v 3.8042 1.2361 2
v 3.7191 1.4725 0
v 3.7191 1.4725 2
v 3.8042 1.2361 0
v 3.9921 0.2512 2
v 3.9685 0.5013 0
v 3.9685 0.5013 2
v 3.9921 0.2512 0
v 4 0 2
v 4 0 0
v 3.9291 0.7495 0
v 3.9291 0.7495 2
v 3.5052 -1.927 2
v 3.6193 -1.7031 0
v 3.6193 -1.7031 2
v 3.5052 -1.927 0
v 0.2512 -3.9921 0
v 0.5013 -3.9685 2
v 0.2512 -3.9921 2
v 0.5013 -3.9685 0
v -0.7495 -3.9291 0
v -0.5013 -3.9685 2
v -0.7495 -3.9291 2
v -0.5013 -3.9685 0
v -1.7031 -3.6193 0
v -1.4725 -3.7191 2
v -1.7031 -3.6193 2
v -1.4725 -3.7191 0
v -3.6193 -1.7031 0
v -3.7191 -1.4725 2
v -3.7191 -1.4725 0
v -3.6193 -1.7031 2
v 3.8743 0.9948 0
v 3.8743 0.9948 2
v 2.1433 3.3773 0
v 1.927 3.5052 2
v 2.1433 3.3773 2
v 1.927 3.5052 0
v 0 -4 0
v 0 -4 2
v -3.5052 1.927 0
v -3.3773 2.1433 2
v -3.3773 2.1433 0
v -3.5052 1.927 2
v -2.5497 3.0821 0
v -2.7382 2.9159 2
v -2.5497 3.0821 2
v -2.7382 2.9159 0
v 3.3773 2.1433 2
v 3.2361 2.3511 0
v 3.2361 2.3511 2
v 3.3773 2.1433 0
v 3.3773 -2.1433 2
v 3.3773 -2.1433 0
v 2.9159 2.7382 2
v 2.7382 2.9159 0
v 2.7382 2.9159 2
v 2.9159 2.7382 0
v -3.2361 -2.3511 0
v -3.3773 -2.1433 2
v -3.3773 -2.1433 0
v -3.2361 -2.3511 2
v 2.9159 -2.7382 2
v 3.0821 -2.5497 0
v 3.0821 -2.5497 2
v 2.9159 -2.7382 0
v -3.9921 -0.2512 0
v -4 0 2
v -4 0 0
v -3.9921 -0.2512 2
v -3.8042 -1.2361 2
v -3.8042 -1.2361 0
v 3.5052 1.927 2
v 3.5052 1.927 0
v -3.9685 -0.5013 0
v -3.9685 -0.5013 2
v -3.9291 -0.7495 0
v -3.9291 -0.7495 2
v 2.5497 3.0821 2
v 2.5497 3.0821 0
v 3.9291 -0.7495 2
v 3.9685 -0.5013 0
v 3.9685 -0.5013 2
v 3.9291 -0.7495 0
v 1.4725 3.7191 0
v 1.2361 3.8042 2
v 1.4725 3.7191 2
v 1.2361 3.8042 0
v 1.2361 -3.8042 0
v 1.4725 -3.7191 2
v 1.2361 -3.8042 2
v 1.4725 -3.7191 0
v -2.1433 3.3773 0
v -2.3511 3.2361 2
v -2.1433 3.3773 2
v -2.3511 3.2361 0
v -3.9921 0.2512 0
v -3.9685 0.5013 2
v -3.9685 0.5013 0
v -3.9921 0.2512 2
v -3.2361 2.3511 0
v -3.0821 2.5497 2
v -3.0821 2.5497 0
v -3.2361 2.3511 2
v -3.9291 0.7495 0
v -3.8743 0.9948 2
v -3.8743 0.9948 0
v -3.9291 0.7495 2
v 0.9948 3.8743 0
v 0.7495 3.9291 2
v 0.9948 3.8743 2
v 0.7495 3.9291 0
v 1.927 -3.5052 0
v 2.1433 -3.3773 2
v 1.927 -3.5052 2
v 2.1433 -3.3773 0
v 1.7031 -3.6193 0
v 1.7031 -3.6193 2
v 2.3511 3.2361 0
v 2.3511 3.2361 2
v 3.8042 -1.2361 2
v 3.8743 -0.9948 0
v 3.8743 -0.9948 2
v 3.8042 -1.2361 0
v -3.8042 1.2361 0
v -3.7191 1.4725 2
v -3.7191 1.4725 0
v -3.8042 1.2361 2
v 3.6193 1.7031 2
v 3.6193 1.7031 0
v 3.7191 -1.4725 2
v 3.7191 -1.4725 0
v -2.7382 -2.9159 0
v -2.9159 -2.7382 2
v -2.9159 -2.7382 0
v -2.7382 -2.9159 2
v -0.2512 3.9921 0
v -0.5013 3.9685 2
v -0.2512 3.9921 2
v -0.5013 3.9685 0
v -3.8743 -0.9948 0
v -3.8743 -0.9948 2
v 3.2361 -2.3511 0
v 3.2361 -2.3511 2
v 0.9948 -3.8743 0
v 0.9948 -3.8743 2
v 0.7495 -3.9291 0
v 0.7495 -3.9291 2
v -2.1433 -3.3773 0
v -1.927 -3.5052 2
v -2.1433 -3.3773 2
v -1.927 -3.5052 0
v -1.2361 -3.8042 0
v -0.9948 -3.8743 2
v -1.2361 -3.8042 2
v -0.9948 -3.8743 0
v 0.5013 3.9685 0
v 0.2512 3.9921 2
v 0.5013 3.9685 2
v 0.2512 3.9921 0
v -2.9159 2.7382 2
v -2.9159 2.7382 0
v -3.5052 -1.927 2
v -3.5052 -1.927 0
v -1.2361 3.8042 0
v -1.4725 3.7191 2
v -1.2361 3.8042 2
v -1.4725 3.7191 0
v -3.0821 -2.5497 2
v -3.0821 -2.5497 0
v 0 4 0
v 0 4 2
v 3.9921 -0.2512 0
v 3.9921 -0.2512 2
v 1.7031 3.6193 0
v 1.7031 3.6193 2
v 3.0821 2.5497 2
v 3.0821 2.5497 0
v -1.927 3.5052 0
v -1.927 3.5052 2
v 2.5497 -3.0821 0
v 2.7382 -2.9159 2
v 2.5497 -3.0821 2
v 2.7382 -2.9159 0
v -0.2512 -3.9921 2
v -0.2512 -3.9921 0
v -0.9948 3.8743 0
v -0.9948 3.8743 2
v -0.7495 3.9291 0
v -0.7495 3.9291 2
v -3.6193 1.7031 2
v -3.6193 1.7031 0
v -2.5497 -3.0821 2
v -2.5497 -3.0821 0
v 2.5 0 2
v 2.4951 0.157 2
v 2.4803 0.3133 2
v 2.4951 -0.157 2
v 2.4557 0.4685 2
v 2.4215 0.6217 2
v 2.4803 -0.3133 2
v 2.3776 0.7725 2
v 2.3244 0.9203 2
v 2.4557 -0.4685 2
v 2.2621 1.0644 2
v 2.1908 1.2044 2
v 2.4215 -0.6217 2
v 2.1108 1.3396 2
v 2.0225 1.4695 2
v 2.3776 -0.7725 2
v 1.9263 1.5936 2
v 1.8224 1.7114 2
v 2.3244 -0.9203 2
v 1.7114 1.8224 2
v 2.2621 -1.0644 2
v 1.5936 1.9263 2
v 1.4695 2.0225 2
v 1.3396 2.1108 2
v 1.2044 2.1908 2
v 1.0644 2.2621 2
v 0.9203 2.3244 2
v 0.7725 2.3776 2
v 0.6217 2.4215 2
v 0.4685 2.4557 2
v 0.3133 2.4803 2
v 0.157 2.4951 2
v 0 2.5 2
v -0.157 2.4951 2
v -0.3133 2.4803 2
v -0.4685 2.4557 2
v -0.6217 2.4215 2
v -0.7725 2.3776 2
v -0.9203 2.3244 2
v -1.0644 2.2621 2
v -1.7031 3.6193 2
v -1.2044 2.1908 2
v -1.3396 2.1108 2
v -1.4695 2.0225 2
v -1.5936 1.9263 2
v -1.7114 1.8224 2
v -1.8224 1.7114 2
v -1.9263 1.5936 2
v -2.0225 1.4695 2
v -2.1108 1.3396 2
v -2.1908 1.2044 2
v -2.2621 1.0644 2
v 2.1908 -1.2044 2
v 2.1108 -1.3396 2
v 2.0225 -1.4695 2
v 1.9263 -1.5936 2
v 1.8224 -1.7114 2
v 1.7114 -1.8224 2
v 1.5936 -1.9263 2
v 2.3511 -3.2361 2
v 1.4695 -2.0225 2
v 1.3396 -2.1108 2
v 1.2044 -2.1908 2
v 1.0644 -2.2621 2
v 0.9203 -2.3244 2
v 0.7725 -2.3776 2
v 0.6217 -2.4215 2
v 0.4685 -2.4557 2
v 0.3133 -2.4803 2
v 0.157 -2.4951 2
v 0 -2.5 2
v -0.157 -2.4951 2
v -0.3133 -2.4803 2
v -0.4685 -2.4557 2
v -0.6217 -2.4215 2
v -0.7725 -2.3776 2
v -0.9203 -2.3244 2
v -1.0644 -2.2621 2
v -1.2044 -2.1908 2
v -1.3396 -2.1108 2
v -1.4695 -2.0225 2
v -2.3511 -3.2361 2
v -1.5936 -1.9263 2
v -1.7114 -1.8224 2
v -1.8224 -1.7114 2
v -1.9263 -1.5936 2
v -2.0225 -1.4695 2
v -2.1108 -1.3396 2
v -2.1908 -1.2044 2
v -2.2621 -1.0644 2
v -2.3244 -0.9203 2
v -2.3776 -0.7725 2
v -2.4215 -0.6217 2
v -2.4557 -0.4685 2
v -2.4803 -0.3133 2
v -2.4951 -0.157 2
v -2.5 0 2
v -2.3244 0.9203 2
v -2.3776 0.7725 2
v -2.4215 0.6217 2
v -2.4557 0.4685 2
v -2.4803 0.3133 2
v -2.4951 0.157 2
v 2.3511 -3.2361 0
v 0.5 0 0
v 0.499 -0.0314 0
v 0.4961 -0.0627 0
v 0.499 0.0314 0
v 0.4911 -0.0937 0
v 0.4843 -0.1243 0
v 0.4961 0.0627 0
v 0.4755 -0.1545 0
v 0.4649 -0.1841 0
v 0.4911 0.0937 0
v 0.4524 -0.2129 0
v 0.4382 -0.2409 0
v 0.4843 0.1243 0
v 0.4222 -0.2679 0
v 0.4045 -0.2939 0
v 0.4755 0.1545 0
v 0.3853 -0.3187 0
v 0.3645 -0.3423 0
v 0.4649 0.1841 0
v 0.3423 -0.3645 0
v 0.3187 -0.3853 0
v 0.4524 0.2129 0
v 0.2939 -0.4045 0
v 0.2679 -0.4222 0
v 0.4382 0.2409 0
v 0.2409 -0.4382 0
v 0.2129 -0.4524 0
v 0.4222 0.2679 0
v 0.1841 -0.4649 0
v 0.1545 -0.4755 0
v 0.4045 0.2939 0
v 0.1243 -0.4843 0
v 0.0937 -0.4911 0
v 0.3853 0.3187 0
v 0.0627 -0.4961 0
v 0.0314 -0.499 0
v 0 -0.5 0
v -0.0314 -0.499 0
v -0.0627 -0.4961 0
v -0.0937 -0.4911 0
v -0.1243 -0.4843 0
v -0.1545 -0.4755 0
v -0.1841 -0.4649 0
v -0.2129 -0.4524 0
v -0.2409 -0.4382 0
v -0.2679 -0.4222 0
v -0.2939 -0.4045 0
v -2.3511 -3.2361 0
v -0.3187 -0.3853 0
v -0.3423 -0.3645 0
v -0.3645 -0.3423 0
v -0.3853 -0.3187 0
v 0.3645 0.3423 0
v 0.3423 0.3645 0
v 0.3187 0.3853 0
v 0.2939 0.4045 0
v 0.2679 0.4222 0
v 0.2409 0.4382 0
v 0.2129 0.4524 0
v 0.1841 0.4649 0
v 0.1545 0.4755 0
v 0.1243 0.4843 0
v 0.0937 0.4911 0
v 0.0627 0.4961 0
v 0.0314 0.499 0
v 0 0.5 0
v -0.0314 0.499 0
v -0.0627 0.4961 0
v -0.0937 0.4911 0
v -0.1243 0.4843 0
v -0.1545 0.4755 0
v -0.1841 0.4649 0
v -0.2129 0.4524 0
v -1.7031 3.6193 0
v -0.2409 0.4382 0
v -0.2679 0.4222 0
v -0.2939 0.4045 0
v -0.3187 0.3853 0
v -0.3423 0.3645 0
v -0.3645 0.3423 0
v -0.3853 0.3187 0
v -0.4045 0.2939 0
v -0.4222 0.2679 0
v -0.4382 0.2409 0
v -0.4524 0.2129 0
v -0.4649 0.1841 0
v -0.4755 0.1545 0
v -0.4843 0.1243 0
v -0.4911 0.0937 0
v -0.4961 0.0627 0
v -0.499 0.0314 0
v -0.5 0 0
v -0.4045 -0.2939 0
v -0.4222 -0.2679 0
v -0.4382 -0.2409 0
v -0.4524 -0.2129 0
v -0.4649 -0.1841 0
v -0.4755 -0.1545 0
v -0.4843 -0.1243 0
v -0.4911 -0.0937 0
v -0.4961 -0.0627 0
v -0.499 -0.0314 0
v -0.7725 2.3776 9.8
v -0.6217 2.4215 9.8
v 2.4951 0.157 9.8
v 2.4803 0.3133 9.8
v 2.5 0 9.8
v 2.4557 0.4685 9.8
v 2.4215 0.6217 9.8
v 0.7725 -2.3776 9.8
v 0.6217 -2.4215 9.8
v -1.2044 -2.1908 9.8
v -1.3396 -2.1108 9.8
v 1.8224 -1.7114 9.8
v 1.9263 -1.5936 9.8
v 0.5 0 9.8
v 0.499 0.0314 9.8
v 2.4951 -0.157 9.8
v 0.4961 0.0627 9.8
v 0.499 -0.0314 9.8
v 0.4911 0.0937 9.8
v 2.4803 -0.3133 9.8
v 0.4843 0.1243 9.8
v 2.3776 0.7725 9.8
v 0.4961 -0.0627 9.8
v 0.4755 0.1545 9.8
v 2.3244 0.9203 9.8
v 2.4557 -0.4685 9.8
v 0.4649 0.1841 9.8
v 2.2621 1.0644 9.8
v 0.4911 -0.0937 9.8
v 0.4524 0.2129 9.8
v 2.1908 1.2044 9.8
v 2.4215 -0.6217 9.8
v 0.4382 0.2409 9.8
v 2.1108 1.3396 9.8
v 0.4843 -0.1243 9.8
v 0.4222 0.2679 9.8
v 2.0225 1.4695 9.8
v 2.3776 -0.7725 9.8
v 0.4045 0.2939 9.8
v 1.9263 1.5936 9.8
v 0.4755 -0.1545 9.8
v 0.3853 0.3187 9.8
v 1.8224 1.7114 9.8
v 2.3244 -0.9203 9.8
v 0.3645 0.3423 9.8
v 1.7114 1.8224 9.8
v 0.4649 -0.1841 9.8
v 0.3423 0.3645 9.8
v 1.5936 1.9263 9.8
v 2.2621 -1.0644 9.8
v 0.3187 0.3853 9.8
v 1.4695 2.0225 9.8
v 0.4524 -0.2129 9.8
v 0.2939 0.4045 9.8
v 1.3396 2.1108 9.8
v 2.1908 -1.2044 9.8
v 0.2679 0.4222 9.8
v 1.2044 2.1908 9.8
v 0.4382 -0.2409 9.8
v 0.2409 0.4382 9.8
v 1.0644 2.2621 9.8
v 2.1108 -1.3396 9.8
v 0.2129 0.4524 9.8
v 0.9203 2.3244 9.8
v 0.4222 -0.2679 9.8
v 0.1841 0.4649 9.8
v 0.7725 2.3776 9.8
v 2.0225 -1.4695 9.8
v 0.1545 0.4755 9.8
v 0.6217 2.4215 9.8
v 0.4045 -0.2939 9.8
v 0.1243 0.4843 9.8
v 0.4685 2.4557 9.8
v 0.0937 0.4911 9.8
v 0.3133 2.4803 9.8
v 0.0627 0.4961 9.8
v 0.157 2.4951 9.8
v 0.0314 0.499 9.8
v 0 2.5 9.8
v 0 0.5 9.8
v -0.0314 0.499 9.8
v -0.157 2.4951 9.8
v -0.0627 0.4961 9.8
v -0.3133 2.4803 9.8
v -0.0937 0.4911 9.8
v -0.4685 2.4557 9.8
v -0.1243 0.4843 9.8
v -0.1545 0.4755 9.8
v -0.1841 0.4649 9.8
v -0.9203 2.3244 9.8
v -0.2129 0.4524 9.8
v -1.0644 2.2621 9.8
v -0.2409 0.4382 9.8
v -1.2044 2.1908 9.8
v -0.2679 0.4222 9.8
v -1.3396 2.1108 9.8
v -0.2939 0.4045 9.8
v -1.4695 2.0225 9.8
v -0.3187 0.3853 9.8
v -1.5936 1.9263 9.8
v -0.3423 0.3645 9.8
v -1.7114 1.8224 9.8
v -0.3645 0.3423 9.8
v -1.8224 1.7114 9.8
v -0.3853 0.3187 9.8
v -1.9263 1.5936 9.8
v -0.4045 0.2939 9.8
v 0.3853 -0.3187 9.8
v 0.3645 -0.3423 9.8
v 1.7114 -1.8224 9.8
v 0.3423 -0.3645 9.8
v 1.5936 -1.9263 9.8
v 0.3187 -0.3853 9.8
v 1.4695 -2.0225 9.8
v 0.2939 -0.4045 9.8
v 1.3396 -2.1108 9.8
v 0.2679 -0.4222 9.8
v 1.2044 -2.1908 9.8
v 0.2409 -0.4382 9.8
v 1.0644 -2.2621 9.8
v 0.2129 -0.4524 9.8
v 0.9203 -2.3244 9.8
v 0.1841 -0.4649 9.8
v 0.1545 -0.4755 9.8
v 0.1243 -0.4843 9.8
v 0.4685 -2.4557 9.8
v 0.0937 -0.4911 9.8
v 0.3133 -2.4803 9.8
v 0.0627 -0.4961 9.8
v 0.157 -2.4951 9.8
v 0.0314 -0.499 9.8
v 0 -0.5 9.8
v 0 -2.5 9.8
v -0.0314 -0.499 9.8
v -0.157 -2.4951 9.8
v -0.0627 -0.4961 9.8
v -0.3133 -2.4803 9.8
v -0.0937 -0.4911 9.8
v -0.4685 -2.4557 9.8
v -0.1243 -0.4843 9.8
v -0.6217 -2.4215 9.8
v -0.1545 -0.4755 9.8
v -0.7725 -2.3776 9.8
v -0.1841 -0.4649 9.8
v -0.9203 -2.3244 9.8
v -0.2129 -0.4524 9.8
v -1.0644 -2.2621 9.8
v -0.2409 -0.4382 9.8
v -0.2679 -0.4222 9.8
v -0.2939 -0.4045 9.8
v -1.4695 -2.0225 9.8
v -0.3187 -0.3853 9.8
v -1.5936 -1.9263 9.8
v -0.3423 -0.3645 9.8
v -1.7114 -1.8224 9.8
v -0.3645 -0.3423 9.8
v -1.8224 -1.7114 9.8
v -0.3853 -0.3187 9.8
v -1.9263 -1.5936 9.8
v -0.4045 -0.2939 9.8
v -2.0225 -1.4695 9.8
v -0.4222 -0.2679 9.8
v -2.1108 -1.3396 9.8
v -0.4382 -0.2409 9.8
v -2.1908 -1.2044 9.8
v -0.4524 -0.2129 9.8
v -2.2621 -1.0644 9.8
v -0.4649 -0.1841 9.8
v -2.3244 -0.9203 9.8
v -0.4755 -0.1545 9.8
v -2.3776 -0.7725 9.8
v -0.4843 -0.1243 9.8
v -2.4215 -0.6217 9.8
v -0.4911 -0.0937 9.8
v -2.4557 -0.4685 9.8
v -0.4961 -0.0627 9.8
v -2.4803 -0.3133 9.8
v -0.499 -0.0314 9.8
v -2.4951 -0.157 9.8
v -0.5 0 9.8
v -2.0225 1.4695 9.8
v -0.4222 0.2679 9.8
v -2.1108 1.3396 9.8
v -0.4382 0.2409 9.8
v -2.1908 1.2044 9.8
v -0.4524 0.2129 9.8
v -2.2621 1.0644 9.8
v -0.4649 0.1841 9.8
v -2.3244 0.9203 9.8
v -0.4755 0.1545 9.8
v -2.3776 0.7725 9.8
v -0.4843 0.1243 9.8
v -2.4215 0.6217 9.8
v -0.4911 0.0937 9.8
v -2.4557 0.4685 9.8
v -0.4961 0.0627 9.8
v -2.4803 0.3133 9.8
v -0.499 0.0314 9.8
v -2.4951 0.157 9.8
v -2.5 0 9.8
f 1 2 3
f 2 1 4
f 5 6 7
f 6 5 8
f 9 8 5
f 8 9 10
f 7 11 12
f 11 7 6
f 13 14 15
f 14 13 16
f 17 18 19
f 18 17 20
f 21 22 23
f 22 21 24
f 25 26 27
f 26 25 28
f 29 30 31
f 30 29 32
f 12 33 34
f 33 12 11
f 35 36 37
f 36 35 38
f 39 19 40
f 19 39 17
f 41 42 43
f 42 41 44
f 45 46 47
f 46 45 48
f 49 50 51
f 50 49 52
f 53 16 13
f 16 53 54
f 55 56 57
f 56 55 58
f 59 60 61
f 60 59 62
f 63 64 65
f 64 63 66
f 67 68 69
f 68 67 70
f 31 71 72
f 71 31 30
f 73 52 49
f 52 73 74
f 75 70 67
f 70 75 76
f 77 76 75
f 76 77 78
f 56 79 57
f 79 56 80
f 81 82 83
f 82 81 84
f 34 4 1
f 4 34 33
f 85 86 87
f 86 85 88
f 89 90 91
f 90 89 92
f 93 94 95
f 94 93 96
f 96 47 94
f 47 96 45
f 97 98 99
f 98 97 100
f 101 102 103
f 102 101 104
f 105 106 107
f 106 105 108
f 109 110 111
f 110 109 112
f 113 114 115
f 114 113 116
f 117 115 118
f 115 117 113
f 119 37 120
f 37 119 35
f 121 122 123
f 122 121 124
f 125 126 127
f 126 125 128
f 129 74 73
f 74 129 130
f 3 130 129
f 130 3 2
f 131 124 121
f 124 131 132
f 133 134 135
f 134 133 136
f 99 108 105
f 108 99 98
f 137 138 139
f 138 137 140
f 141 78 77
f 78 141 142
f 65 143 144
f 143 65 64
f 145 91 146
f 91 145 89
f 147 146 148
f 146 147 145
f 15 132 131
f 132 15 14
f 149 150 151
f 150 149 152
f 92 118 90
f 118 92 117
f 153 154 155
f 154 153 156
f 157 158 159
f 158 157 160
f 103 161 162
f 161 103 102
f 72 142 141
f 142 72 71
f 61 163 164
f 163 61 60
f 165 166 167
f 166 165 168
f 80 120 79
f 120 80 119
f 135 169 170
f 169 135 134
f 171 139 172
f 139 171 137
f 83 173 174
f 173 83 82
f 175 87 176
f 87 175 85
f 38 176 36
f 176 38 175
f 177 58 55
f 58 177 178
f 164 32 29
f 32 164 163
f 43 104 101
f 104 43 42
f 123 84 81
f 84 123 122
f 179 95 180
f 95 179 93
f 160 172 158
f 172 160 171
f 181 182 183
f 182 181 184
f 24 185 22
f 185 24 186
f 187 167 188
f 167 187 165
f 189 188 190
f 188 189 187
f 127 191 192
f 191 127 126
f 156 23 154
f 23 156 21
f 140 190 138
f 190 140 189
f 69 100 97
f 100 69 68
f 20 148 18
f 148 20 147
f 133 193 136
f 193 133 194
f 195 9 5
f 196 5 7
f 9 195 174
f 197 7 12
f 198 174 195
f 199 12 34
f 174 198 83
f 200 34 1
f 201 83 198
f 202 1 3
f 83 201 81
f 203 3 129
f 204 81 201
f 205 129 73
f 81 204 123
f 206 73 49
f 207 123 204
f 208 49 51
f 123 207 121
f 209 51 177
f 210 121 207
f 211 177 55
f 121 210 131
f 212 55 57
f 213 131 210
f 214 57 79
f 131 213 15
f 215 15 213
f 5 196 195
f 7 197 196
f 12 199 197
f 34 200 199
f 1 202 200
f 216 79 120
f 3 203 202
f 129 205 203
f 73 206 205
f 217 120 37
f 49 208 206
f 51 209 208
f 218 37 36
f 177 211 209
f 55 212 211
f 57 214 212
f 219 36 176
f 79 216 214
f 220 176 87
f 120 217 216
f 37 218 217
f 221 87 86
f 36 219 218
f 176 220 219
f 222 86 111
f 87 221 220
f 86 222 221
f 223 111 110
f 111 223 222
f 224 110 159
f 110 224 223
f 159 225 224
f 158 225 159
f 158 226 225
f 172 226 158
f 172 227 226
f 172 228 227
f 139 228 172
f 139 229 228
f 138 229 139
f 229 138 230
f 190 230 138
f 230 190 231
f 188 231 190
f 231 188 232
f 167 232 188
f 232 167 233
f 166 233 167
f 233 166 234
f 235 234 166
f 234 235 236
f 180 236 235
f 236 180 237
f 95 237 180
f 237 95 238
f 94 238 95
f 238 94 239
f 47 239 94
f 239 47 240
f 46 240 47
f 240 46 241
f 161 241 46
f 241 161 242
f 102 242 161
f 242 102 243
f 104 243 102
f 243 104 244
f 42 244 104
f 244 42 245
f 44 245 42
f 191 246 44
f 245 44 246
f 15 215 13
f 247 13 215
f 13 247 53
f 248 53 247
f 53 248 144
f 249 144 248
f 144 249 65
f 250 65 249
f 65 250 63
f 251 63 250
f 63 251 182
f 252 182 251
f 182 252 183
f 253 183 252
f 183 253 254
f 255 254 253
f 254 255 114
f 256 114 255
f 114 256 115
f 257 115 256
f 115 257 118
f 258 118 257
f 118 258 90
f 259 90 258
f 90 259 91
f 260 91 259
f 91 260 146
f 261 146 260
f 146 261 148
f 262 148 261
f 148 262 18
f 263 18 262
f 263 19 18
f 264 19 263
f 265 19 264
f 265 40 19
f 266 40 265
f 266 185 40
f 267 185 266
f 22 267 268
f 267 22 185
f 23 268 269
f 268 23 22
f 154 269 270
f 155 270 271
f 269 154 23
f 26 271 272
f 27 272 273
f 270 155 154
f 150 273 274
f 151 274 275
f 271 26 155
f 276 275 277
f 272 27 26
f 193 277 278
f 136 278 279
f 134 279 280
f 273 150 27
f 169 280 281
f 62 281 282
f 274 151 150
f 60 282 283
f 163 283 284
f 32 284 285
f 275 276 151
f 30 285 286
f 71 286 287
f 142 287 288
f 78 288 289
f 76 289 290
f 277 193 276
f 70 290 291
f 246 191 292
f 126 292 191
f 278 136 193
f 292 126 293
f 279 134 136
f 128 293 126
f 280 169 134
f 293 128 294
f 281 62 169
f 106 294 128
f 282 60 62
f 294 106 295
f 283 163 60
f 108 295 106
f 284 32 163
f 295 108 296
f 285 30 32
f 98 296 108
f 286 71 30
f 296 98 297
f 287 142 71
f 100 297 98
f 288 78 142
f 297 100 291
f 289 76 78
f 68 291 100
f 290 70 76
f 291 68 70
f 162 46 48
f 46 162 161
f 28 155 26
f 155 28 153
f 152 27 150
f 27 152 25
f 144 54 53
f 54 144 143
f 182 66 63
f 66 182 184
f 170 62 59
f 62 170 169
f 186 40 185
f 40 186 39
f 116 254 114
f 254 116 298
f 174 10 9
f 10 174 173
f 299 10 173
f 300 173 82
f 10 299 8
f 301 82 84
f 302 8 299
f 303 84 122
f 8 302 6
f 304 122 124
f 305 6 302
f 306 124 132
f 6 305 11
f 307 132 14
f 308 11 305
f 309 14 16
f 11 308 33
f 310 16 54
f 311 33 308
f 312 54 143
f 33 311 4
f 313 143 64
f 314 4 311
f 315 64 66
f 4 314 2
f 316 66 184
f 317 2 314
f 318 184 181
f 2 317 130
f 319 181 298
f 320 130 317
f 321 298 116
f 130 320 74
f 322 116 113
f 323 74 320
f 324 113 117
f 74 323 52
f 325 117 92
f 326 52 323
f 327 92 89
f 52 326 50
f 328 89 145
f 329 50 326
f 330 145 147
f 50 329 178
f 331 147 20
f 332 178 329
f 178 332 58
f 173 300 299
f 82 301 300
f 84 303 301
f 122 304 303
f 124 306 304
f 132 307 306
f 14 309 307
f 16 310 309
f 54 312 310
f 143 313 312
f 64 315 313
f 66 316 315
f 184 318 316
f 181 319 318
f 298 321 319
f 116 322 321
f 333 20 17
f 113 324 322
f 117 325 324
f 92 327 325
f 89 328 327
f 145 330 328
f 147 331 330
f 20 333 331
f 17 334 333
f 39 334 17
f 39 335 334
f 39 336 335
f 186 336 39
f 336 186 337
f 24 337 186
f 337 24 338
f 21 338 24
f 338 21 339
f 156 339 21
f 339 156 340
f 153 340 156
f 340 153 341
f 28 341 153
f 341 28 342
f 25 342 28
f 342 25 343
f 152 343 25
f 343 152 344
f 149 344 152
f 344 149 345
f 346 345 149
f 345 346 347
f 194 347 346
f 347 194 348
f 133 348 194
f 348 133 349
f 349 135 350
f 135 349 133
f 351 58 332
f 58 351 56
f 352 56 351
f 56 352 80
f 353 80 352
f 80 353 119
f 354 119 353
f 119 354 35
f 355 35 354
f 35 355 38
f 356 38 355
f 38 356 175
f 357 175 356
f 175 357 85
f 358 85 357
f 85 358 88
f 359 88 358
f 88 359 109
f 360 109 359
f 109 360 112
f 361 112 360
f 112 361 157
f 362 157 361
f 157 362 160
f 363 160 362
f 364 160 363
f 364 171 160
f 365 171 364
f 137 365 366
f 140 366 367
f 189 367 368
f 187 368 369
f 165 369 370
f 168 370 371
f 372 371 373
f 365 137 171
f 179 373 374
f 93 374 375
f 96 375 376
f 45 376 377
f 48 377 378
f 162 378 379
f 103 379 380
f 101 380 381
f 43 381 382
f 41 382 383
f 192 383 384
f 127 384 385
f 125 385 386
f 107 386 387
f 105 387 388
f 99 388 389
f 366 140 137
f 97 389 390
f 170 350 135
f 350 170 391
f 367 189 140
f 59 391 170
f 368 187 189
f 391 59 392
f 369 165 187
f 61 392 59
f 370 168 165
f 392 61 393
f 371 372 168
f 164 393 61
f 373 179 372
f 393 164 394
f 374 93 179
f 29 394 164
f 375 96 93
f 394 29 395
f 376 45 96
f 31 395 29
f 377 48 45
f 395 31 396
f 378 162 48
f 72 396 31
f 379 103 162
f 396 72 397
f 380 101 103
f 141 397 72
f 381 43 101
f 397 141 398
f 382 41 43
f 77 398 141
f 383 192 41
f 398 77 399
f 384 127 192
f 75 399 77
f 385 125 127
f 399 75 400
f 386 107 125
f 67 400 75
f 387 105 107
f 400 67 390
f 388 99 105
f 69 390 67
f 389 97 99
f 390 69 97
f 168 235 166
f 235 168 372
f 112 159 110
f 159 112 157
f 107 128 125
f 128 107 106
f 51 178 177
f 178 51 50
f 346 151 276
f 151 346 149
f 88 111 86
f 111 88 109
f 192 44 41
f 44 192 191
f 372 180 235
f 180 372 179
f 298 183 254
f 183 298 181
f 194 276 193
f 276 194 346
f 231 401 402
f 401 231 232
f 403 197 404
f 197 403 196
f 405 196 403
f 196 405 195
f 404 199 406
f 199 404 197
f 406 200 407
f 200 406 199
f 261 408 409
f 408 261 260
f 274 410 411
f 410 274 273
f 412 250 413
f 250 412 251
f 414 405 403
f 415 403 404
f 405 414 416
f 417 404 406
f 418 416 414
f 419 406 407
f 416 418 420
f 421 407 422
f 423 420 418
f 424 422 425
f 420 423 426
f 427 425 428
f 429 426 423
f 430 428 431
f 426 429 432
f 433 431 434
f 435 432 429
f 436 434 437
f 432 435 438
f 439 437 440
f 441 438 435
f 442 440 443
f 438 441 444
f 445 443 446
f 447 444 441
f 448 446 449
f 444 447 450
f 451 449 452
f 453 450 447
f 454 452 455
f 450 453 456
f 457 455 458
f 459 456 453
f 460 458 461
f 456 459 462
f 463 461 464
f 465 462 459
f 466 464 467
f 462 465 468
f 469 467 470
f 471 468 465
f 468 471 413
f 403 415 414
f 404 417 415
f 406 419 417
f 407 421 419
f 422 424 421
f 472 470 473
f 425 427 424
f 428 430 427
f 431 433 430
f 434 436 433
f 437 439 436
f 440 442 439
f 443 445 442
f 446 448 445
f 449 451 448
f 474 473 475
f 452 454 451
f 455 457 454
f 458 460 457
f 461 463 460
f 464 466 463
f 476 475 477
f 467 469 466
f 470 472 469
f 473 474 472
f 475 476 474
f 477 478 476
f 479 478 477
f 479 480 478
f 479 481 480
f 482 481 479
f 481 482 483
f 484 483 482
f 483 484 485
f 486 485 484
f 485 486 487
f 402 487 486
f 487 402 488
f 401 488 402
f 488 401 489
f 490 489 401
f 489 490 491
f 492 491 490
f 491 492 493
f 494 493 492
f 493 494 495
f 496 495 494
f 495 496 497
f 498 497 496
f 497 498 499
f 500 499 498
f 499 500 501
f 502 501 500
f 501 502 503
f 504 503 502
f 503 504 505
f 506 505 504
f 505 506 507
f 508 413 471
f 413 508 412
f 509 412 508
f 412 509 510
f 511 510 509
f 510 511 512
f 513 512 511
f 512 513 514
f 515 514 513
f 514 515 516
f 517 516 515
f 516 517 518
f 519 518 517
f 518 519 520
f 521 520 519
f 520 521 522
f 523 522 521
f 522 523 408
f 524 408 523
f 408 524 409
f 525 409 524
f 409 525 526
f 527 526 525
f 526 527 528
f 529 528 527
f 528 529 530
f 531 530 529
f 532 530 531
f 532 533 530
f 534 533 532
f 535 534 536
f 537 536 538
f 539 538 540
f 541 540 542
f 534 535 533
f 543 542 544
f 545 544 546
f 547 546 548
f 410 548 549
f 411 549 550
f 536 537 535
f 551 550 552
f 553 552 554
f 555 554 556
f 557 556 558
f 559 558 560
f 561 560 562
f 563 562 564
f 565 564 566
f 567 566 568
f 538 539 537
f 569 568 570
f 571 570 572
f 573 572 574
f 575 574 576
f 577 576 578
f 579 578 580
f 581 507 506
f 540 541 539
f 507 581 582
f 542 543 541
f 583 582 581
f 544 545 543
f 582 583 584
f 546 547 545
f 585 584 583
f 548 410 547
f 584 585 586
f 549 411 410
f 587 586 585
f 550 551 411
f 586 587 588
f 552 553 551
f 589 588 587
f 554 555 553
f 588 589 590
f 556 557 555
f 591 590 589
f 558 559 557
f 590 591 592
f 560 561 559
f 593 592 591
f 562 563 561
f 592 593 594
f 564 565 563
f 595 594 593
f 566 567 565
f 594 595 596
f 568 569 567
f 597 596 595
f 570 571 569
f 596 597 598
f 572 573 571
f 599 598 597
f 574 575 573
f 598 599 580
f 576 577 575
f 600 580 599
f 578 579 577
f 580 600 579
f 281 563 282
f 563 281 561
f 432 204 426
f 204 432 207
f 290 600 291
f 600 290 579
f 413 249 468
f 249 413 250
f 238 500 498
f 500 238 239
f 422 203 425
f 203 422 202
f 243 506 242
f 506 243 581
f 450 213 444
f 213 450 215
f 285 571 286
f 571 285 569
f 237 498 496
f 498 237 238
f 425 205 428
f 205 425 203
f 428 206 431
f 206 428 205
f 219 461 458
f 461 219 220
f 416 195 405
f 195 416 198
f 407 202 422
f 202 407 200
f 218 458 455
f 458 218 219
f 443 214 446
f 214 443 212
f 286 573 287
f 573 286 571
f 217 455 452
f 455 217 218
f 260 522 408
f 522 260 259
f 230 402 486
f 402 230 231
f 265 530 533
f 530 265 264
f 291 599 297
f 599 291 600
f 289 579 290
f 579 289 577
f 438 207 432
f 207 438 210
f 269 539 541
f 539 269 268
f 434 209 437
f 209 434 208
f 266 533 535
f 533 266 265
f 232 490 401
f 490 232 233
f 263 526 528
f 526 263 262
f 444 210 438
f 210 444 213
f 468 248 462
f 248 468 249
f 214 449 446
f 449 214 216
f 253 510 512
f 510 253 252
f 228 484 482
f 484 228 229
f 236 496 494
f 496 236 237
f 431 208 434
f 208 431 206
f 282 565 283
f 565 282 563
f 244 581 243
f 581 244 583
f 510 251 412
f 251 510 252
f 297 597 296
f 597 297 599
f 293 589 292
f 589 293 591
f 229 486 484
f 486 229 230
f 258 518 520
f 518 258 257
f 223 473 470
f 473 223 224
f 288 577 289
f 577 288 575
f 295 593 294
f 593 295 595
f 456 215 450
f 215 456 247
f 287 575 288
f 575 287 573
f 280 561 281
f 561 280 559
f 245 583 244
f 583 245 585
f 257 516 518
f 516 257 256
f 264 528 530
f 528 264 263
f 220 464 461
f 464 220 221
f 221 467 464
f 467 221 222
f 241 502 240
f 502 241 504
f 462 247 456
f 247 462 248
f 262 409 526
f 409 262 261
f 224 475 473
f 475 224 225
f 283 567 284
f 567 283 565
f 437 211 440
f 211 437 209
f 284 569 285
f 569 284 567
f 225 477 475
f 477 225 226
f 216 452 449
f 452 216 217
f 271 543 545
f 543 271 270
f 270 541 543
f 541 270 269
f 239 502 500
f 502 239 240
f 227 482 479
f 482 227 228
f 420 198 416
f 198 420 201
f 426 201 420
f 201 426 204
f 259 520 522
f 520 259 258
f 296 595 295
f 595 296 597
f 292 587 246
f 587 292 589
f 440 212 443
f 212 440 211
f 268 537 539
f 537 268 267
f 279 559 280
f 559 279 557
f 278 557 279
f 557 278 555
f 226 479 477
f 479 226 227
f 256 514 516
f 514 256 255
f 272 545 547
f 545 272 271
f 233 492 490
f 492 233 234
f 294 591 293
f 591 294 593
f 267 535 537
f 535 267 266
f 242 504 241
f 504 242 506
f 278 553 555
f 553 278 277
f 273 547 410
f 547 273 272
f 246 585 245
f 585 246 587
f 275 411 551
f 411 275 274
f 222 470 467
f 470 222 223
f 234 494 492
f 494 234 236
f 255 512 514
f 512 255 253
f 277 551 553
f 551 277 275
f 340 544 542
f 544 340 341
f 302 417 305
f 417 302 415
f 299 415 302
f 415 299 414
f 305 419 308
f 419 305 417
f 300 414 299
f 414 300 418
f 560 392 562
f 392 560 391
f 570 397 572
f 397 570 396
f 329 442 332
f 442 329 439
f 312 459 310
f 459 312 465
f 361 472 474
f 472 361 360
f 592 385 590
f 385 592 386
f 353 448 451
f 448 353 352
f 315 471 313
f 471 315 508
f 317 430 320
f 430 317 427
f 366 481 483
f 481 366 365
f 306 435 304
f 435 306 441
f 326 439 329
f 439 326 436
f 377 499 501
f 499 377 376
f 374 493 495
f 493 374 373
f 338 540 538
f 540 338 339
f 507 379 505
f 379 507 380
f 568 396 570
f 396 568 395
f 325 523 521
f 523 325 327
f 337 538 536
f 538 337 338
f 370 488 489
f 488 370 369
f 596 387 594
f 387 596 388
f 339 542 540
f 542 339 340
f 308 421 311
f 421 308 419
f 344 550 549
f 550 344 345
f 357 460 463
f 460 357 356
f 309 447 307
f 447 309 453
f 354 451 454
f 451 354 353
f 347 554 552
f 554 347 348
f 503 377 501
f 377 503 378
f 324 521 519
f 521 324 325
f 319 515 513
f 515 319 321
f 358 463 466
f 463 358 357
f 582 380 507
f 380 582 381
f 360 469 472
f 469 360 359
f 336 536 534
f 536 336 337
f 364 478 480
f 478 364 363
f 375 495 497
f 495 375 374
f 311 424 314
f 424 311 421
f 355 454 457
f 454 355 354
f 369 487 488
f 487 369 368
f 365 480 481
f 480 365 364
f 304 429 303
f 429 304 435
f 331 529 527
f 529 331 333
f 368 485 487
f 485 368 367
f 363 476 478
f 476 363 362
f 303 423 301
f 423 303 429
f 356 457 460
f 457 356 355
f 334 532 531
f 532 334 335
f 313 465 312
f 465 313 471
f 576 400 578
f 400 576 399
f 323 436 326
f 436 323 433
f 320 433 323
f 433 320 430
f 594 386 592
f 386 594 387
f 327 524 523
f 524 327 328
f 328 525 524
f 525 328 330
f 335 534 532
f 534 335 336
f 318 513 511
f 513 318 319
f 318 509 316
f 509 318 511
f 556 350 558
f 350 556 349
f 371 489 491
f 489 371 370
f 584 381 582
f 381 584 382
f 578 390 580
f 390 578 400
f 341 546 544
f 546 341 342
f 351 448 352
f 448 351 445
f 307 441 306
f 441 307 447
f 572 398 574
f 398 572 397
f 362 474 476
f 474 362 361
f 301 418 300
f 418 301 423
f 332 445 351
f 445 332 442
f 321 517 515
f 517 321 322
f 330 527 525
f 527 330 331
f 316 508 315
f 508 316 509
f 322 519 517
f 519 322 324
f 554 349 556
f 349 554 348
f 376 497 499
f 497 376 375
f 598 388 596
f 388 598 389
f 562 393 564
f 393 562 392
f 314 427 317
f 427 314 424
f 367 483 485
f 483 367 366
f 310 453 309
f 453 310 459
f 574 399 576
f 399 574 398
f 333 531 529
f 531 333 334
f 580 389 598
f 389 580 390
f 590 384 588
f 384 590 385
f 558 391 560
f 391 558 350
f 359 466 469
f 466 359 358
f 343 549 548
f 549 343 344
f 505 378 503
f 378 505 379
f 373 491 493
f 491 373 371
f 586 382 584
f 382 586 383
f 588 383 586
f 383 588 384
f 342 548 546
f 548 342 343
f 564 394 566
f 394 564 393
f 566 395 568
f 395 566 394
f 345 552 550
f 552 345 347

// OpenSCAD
$fa = 6;
$fs = 0.2;
$fn = 100;

d_centre=1;
d_axe=5;
d_tete=8;
h_axe=7.8;
h_tete=2;

difference() {
    union() {
	cylinder(d = d_tete, h=h_tete);
        cylinder(d = d_axe, h=h_tete+h_axe);
    };
    translate([0,0,-1]) cylinder(d = d_centre, h=h_tete+h_axe+2);
};
